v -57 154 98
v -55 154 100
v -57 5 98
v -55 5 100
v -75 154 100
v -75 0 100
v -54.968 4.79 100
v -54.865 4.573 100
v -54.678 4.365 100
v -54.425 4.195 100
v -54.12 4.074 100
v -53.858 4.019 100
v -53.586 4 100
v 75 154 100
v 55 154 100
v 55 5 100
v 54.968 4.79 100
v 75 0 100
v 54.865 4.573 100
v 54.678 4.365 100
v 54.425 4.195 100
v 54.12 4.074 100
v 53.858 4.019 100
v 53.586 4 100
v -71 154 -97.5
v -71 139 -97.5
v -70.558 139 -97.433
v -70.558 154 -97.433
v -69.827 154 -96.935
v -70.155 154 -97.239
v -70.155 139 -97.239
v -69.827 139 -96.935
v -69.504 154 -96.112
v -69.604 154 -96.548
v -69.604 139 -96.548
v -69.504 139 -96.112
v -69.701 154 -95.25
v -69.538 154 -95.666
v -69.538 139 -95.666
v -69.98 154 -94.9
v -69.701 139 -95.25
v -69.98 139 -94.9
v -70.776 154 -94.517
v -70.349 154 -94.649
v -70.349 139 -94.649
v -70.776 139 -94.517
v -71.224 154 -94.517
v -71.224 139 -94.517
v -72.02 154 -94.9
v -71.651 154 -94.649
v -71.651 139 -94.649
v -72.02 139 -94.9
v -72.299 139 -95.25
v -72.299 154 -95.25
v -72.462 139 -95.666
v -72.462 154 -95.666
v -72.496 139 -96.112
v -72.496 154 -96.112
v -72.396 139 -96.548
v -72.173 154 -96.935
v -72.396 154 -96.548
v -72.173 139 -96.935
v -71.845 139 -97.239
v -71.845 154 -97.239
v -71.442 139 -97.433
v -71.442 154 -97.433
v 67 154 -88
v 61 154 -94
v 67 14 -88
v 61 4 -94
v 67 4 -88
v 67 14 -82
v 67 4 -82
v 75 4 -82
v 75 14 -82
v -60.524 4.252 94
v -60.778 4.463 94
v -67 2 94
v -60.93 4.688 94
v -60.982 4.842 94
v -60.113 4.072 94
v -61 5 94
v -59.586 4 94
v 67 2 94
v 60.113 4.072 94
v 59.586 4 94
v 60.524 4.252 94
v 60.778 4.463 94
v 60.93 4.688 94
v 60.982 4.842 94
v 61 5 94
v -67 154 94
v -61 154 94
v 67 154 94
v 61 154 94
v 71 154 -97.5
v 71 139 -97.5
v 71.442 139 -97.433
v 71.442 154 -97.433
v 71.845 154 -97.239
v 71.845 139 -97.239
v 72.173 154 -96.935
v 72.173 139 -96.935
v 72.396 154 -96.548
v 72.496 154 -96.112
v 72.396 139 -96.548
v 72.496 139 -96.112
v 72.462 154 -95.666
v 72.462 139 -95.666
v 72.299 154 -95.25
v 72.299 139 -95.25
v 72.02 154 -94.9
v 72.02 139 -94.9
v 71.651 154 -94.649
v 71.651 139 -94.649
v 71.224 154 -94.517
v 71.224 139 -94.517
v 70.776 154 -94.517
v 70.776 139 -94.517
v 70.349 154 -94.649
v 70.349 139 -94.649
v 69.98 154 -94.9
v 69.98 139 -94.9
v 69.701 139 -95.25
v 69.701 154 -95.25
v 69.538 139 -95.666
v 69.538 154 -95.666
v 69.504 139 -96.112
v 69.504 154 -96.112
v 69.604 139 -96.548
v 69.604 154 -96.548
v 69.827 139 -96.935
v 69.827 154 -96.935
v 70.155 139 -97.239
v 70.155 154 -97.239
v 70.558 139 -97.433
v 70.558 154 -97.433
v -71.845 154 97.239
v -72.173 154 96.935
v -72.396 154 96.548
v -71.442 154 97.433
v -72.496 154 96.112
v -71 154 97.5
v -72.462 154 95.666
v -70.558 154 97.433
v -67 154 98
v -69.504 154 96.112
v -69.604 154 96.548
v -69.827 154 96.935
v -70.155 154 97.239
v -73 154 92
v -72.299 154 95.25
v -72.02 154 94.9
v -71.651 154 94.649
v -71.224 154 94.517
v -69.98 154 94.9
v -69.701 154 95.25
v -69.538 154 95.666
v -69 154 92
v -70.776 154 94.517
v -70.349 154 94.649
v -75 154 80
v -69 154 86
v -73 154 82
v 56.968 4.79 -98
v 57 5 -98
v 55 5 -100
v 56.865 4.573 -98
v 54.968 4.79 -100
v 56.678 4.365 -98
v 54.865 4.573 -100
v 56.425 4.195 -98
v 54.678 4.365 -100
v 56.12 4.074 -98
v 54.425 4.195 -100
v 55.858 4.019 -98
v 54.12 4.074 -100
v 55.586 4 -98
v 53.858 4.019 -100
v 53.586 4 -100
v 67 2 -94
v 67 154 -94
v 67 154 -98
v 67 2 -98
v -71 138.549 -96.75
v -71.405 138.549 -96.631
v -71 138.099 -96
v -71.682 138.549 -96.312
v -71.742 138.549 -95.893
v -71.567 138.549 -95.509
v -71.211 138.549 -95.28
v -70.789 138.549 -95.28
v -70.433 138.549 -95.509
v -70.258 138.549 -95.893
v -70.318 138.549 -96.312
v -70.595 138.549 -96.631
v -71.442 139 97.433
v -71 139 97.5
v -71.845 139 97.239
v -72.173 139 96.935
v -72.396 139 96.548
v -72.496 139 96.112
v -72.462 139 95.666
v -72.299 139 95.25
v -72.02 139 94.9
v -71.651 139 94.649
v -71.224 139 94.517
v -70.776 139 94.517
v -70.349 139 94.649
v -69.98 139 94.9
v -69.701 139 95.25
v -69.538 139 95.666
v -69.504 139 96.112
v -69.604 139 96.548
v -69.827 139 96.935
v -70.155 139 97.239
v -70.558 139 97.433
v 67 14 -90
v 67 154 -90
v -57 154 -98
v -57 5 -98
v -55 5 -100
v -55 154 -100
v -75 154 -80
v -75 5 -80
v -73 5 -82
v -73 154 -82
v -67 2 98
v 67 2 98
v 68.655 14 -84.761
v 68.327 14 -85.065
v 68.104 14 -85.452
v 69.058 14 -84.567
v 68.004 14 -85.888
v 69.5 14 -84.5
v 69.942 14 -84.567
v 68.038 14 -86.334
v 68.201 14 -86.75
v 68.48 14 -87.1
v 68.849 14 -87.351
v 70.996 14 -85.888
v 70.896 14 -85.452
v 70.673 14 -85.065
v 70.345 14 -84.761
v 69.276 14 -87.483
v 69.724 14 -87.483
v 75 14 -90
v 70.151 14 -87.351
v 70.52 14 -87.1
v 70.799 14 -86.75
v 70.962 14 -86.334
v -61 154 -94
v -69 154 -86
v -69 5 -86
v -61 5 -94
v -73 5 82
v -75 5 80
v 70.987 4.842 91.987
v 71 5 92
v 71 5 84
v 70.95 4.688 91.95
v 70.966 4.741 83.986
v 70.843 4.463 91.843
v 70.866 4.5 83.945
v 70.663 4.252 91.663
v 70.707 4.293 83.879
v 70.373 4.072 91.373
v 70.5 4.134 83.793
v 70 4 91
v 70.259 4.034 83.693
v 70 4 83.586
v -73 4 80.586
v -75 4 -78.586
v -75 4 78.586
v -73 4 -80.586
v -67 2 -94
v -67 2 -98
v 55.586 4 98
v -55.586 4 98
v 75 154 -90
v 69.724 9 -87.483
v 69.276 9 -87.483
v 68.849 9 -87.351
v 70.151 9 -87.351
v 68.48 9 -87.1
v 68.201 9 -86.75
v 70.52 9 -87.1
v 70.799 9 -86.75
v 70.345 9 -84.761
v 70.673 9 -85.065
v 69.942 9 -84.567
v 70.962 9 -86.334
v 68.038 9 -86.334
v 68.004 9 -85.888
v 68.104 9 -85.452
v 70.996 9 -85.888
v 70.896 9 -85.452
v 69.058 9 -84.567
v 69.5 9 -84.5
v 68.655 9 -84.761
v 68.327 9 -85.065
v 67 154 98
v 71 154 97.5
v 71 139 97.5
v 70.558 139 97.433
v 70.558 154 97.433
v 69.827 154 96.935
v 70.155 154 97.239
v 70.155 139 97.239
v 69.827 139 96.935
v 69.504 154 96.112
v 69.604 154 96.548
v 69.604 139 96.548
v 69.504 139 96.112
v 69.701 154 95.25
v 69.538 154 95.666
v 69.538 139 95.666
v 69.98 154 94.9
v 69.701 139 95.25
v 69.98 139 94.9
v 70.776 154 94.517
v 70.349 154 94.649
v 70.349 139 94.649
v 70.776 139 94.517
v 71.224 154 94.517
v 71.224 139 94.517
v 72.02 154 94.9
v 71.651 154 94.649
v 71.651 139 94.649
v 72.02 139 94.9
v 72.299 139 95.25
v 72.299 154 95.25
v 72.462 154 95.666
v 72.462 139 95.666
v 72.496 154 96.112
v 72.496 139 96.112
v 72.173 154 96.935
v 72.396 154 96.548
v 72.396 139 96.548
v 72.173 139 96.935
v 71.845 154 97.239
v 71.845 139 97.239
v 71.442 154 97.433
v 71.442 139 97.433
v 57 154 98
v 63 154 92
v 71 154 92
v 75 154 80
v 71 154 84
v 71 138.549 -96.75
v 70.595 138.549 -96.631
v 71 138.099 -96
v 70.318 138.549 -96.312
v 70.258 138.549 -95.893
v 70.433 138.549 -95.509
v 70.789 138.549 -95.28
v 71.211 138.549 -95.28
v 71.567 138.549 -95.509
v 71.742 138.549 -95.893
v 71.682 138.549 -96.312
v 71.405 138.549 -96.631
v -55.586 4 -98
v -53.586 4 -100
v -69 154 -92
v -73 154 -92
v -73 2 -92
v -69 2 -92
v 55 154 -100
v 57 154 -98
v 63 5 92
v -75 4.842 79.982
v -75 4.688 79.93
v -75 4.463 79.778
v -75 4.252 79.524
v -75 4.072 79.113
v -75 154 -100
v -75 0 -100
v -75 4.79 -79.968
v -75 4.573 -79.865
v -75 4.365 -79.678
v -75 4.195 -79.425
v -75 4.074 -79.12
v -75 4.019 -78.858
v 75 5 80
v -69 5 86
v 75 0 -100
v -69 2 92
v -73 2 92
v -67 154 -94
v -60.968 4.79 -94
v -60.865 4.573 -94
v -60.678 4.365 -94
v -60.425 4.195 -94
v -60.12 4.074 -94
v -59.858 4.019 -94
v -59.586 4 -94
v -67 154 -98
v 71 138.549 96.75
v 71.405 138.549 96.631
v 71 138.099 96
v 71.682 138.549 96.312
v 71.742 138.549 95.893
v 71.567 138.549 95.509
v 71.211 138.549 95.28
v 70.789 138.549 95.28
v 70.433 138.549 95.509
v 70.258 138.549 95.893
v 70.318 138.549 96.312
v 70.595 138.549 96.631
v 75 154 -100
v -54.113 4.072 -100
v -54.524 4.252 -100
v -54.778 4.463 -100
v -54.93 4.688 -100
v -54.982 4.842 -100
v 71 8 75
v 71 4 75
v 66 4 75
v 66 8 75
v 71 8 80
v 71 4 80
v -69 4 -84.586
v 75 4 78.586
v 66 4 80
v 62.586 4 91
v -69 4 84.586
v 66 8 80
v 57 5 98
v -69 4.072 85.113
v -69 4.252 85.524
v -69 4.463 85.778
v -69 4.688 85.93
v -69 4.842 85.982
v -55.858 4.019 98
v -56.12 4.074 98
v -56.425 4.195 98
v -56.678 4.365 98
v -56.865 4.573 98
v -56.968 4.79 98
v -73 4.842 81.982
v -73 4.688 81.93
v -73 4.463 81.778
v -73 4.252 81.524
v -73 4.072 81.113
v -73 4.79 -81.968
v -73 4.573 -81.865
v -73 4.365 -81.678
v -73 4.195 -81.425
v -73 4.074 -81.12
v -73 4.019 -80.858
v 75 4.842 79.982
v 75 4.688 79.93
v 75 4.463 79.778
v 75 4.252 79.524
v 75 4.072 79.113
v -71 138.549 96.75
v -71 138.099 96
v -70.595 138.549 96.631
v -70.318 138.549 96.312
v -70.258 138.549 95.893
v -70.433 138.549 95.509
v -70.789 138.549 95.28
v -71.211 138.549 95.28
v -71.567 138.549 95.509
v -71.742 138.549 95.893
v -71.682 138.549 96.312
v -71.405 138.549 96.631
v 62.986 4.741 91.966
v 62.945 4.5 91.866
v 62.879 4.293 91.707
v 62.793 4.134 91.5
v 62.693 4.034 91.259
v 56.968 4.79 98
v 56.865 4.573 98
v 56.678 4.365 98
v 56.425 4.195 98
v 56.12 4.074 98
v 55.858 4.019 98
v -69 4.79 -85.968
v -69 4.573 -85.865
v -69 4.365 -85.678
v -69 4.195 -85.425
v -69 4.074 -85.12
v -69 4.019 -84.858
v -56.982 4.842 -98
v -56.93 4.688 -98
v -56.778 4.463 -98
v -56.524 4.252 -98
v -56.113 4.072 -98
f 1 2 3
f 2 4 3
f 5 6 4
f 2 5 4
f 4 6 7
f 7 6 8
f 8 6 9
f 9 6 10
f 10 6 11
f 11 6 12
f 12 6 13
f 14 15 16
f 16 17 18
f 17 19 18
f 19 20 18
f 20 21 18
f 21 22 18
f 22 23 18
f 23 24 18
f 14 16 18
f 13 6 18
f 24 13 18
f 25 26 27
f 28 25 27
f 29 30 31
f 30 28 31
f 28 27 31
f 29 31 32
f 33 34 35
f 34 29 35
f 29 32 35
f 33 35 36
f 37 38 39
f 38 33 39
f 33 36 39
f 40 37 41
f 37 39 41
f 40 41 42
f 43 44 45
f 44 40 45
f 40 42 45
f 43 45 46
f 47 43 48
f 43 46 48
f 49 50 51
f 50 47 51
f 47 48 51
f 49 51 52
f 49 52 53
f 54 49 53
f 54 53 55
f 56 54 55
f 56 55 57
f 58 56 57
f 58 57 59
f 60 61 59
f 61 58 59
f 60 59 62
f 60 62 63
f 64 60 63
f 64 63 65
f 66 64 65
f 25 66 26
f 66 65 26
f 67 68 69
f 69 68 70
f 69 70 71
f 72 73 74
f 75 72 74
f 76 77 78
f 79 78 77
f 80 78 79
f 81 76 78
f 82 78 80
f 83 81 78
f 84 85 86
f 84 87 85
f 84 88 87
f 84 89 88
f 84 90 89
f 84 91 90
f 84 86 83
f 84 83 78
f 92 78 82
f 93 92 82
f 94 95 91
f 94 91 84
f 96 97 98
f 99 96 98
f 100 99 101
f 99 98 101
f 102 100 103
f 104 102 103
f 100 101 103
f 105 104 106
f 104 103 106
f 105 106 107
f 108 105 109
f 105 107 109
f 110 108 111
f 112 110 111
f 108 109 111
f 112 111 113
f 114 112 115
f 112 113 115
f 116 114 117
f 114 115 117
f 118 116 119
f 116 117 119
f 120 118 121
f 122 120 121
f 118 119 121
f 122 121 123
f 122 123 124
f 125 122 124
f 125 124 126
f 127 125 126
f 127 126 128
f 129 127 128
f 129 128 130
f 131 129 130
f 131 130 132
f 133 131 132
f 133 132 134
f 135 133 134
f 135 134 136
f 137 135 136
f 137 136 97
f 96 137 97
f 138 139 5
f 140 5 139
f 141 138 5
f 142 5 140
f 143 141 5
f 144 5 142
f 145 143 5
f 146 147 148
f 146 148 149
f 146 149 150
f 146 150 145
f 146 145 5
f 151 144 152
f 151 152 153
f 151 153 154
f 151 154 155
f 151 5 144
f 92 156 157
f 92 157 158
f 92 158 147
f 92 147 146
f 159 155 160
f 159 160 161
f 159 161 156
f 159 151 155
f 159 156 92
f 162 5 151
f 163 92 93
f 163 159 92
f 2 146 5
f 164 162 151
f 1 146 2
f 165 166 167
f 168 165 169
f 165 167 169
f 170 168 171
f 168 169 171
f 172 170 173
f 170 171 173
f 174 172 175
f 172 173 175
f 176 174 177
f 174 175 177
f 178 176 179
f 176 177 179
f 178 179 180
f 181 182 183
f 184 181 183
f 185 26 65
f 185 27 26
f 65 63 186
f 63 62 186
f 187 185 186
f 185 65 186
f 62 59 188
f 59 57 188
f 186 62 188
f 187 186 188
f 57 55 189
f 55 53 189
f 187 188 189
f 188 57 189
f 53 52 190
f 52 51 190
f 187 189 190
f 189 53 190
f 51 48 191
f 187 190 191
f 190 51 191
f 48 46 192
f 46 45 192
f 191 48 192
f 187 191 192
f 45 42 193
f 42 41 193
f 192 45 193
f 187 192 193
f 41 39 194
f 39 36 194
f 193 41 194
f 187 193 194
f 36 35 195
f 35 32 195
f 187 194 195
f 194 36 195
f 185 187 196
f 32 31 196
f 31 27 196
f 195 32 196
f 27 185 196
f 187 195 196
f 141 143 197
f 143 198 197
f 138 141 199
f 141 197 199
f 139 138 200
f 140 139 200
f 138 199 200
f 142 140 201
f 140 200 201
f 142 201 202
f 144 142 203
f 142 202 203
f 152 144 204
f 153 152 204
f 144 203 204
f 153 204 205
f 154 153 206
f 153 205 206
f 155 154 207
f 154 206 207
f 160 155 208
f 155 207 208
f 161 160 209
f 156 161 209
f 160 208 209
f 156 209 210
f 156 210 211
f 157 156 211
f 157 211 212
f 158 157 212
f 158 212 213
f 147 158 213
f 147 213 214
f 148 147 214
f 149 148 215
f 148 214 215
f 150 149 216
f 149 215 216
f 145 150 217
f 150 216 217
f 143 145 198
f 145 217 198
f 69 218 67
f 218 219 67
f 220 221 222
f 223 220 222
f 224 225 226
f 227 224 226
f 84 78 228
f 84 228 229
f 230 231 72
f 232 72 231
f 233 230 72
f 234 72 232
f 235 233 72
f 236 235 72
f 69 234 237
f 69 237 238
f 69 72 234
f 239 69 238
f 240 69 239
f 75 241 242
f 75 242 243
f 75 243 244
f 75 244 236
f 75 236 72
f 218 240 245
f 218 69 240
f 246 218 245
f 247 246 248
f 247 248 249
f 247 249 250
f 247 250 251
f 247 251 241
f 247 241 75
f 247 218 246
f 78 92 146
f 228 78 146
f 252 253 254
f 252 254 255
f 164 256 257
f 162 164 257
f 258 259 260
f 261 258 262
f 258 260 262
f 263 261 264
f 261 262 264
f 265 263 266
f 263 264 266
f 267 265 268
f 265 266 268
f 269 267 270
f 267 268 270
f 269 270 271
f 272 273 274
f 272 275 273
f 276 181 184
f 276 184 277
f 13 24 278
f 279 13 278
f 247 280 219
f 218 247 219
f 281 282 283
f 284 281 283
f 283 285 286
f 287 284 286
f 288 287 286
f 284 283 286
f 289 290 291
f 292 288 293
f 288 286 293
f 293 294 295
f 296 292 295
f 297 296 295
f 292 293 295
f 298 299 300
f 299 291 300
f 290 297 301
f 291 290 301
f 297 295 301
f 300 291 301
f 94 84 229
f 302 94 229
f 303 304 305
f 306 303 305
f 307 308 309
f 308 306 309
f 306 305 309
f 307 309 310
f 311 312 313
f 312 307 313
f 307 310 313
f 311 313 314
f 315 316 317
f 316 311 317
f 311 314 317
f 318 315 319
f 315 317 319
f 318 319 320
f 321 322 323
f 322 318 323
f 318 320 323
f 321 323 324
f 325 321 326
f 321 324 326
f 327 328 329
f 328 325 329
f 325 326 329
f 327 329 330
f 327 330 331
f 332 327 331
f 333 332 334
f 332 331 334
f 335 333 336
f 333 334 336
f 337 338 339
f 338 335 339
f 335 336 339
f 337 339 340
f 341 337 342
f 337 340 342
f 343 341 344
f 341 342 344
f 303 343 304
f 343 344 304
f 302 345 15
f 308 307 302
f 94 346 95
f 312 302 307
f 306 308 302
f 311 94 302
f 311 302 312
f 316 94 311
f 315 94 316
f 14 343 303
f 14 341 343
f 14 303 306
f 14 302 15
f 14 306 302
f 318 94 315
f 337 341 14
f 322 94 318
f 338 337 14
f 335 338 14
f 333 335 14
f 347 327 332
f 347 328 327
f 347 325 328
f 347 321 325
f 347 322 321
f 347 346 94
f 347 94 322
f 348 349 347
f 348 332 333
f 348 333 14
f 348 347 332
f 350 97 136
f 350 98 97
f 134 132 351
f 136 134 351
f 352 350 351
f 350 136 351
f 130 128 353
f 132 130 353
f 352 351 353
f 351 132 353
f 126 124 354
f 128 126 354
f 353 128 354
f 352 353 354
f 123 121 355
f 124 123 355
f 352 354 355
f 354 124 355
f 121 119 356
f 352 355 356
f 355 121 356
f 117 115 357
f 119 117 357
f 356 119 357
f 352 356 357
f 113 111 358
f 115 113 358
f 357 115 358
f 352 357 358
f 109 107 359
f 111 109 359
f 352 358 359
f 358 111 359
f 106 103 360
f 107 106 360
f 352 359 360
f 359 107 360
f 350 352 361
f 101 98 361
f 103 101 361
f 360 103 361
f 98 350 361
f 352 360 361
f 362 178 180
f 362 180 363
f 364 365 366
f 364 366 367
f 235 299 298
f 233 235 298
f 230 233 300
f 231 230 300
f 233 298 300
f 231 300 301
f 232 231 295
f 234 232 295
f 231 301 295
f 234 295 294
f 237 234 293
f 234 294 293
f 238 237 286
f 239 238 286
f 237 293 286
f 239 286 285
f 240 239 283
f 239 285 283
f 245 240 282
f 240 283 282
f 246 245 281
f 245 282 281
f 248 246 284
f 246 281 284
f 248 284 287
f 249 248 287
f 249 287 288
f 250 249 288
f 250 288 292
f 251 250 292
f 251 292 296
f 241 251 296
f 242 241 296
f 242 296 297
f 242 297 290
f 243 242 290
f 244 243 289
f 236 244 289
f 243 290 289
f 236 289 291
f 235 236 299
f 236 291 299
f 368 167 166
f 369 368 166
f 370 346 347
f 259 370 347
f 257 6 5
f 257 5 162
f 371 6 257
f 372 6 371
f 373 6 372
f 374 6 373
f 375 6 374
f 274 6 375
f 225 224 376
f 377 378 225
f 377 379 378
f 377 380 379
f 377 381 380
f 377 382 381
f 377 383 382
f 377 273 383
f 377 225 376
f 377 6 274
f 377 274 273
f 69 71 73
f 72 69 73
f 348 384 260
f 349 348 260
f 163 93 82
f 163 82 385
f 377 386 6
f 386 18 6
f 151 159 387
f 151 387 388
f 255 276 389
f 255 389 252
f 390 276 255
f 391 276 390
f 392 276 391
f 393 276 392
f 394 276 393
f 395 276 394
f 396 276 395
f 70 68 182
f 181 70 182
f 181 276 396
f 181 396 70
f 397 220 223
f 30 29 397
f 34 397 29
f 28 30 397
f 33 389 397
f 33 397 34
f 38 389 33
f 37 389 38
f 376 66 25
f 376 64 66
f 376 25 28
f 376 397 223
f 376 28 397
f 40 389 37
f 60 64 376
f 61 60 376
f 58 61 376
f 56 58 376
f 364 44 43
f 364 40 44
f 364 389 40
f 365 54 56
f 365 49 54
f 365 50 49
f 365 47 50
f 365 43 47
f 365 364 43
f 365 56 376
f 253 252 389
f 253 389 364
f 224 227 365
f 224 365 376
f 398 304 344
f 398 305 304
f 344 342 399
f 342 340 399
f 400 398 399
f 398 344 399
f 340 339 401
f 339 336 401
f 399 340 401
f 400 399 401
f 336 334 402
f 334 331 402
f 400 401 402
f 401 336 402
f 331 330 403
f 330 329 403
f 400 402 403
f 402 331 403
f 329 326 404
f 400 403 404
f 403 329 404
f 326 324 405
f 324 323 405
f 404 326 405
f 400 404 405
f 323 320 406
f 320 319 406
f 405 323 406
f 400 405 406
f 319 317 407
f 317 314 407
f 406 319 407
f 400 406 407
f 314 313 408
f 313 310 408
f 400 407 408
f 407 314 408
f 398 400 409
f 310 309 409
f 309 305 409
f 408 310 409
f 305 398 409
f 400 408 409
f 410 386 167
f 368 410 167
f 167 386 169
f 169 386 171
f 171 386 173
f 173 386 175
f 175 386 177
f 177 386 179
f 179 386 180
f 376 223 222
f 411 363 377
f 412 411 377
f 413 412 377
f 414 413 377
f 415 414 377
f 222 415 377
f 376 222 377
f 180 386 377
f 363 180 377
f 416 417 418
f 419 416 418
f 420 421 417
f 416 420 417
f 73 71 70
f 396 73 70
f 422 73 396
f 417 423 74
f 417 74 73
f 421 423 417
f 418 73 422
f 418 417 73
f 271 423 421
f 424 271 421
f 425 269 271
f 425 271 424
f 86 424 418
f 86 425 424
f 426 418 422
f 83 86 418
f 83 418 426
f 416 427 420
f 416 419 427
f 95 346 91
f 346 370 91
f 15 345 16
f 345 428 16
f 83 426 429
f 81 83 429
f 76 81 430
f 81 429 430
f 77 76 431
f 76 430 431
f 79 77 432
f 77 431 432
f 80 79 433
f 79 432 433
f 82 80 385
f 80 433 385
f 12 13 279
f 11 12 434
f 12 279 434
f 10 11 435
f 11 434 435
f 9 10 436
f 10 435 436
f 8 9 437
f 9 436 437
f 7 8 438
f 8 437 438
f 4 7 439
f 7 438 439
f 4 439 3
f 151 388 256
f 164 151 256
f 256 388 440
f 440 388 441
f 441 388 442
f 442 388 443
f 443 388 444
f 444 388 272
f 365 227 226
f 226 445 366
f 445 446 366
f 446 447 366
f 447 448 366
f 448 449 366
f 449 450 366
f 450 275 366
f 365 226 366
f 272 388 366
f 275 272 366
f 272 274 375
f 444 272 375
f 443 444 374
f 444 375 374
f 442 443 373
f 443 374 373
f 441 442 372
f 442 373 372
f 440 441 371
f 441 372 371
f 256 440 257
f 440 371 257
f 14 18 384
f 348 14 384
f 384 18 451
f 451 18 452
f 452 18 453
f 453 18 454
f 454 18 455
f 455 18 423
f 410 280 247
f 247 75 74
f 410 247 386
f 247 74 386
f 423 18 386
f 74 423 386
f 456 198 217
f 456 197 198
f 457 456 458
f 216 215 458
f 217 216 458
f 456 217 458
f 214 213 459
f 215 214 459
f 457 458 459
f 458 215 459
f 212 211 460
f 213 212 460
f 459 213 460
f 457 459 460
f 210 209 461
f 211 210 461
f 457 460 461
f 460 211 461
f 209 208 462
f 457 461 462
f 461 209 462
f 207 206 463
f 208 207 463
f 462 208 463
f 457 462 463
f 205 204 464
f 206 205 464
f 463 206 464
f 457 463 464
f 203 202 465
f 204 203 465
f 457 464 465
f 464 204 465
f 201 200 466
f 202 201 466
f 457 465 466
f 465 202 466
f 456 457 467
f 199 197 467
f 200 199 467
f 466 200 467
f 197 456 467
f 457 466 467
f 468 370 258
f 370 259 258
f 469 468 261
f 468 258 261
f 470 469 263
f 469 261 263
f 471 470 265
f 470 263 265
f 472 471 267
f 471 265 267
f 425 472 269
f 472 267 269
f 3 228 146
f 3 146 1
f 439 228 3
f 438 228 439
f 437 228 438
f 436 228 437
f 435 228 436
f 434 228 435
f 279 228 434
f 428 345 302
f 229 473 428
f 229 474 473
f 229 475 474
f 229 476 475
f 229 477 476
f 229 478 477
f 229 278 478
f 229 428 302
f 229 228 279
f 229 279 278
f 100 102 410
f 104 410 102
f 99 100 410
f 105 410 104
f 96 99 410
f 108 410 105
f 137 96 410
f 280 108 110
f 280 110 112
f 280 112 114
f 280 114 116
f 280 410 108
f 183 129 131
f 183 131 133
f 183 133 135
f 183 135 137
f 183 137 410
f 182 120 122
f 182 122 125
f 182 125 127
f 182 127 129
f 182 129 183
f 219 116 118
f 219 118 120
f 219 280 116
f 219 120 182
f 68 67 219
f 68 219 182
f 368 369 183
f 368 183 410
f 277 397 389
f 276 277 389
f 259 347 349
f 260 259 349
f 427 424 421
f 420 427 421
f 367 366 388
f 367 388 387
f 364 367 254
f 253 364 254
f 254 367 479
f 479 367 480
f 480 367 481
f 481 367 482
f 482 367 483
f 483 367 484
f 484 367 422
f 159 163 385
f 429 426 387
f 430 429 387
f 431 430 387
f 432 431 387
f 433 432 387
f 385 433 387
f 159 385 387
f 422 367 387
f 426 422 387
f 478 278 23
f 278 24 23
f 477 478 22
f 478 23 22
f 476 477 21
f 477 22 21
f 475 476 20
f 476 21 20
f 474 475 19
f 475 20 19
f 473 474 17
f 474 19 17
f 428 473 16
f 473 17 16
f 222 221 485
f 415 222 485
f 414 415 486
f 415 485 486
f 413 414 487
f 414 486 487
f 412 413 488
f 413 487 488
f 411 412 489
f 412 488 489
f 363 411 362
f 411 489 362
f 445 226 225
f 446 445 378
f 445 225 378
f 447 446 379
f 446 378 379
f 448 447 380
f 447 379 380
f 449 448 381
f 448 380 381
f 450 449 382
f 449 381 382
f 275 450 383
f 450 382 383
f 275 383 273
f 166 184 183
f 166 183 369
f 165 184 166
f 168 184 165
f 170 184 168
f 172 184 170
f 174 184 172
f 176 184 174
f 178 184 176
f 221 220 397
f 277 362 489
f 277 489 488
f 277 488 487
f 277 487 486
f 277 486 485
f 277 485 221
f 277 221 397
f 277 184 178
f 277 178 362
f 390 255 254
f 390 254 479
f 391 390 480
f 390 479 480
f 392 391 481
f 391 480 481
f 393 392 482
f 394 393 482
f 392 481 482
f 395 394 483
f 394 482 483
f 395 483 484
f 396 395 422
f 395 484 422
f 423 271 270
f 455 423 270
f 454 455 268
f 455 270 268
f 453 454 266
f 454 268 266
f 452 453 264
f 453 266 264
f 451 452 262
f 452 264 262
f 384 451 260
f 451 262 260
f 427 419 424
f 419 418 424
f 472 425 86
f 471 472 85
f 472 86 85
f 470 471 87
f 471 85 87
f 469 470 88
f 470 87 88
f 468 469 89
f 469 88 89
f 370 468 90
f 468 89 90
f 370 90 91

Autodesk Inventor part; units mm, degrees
ref_plane "YZ Plane" through (0, 0, 0) normal (1, 0, 0) x (0, 1, 0)
ref_plane "XZ Plane" through (0, 0, 0) normal (0, 1, 0) x (-1, 0, 0)
sketch "Náčrt1" plane through (0, 0, 0) normal (0, 1, 0) x (-1, 0, 0)
  line L0 (75, 100) -> (-75, 100)
  line L1 (-75, 100) -> (-75, -100)
  line L2 (-75, -100) -> (75, -100)
  line L3 (75, -100) -> (75, 100)
  line L4 (105, 0) -> (-105, 0) projected
  line L5 (0, -140) -> (0, 140) projected
  point P0 (0, 0)
  dimension "d0" = 200
  dimension "d1" = 150
extrude "Vysunutí1" add sketch "Náčrt1" along normal blind 4
sketch "Náčrt2" plane through (0, 4, 0) normal (0, 1, 0) x (1, 0, 0)
  line L0 (-75, -100) -> (-75, -80)
  line L1 (-75, -100) -> (-55, -100)
  line L2 (-75, 100) -> (-75, -100) projected
  line L3 (-75, -100) -> (75, -100) projected
  line L4 (-69, -86) -> (-69, -92)
  line L5 (-69, -92) -> (-73, -92)
  line L6 (-73, -92) -> (-73, -82)
  line L7 (-73, -82) -> (-75, -80)
  line L8 (-67, -98) -> (-57, -98)
  line L9 (-61, -94) -> (-67, -94)
  line L10 (-67, -94) -> (-67, -98)
  line L11 (-55, -100) -> (-57, -98)
  line L12 (-61, -94) -> (-69, -86)
  point P0 (0, 0)
  dimension "d4" = 20
  dimension "d9" = 2
  dimension "d10" = 4
  dimension "d11" = 10
  dimension "d12" = 6
  dimension "d13" = 8
  dimension "d17" = 4
  dimension "d18" = 2
  dimension "d19" = 8
  dimension "d20" = 10
  dimension "d21" = 6
extrude "Vysunutí2" add sketch "Náčrt2" along normal blind 150
mirror "Zrcadlit1" about plane through (0, 0, 0) normal (0, 0, 1) of "Vysunutí2"
sketch "Náčrt3" plane through (0, 154, 0) normal (0, 1, 0) x (1, 0, 0)
  line L0 (-69, -92) -> (-73, -92) projected
  line L1 (-67, -98) -> (-67, -94) projected
  point P0 (0, 0)
  point P1 (-71, -96)
  dimension "d22" = 4
  dimension "d23" = 4
hole "Díra1" at (-71, 154, 96) direction (0, -1, 0) diameter 3 depth 15 tip angle 118
mirror "Zrcadlit2" about plane through (0, 0, 0) normal (0, 0, 1) of "Díra1"
sketch "Náčrt4" plane through (0, 4, 0) normal (0, 1, 0) x (1, 0, 0)
  line L0 (55, -100) -> (75, -100)
  line L1 (75, -100) -> (75, -80)
  line L2 (-55, -100) -> (75, -100) projected
  line L3 (75, -100) -> (75, 100) projected
  line L4 (57, -98) -> (67, -98)
  line L5 (67, -98) -> (67, -94)
  line L6 (67, -94) -> (61, -94)
  line L7 (75, -80) -> (61, -94)
  line L8 (57, -98) -> (55, -100)
  point P0 (0, 0)
  dimension "d31" = 20
  dimension "d32" = 20
  dimension "d37" = 10
  dimension "d38" = 6
  dimension "d39" = 8
  dimension "d40" = 2
  dimension "d41" = 45
extrude "Vysunutí3" add sketch "Náčrt4" along normal blind 150
mirror "Zrcadlit3" about plane through (0, 0, 0) normal (0, 0, 1) of "Vysunutí3"
ref_plane "Pracovní rovina1" through (0, 14, 0) normal (0, 1, 0) x (1, 0, 0)
sketch "Náčrt7" plane through (0, 4, 0) normal (0, 1, 0) x (1, 0, 0)
  line L0 (66, -80) -> (71, -80)
  line L1 (71, -80) -> (71, -75)
  line L2 (71, -75) -> (66, -75)
  line L3 (66, -75) -> (66, -80)
  line L4 (75, -80) -> (75, 80) projected
  line L5 (55, -100) -> (75, -100) projected
  point P0 (0, 0)
  dimension "d51" = 4
  dimension "d52" = 5
  dimension "d53" = 20
  dimension "d54" = 5
extrude "Vysunutí6" add sketch "Náčrt7" along normal blind 4
mirror "Zrcadlit4" about plane through (0, 0, 0) normal (1, 0, 0) of "Díra1", "Zrcadlit2"
sketch "Náčrt9" plane through (0, 4, 0) normal (0, 1, 0) x (1, 0, 0)
  line L0 (-67, -94) -> (67, -94)
  line L1 (67, -94) -> (67, -98)
  line L2 (67, -98) -> (-67, -98)
  line L3 (-67, -98) -> (-67, -94)
  line L4 (-67, -98) -> (-67, -94) projected
  line L5 (67, -94) -> (67, -98) projected
  line L6 (-57, -98) -> (-67, -98) projected
  line L7 (-67, -94) -> (-61, -94) projected
  point P0 (0, 0)
extrude "Vysunutí7" cut sketch "Náčrt9" against normal blind 2
mirror "Zrcadlit5" about plane through (0, 0, 0) normal (0, 0, 1) of "Vysunutí7"
sketch "Náčrt10" plane through (0, 4, 0) normal (0, 1, 0) x (1, 0, 0)
  line L0 (-69, -92) -> (-73, -92)
  line L1 (-73, -92) -> (-73, 92)
  line L2 (-73, 92) -> (-69, 92)
  line L3 (-69, 92) -> (-69, -92)
  line L4 (-69, 92) -> (-73, 92) projected
  line L5 (-69, -92) -> (-73, -92) projected
  line L6 (-73, -92) -> (-73, -82) projected
  line L7 (-69, -86) -> (-69, -92) projected
  point P0 (0, 0)
extrude "Vysunutí8" cut sketch "Náčrt10" against normal blind 2
sketch "Náčrt11" plane through (0, 154, 0) normal (0, 1, 0) x (1, 0, 0)
  line L0 (63, -92) -> (71, -92)
  line L1 (71, -92) -> (71, -84)
  line L2 (71, -84) -> (63, -84)
  line L3 (63, -84) -> (63, -92)
  line L4 (66, -80) -> (71, -80) projected
  line L5 (75, -80) -> (75, 80) projected
  line L6 (75, -80) -> (61, -94) projected
  point P0 (0, 0)
  dimension "d70" = 8
  dimension "d71" = 4
extrude "Vysunutí9" cut sketch "Náčrt11" against normal up to surface (150 mm away)
fillet "Zaoblení1" radius 1 12 edges at (-65, 4, 90) (-56, 4, 99) (-74, 4, 81) (-65, 4, -90) (-74, 4, -81) (-56, 4, -99) (56, 4, -99) (56, 4, 99) (62, 4, 93) (73, 4, 82) (67, 4, 92) (71, 4, 88)
sketch "Náčrt13" plane through (55, 154, -100) normal (0, 1, 0) x (1, 0, 0)
  line L0 (20, -10) -> (12, -10)
  line L1 (12, -10) -> (12, -20)
  line L2 (12, -20) -> (20, -20)
  line L3 (20, -20) -> (20, -10)
  line L4 (20, 0) -> (20, -20) projected
  point P0 (-55, -100)
  dimension "d78" = 10
  dimension "d79" = 8
extrude "Vysunutí11" cut sketch "Náčrt13" against normal up to surface (150 mm away)
sketch "Náčrt14" plane through (0, 4, 0) normal (0, 1, 0) x (1, 0, 0)
  line L0 (67, 82) -> (75, 82)
  line L1 (75, 82) -> (75, 90)
  line L2 (75, 90) -> (67, 90)
  line L3 (67, 90) -> (67, 82)
  line L4 (67, 88) -> (67, 90) projected
  line L5 (67, 90) -> (75, 90) projected
  line L6 (75, -78.5858) -> (75, 90) projected
  point P0 (0, 0)
  dimension "d82" = 8
extrude "Vysunutí12" add sketch "Náčrt14" along normal blind 10
sketch "Náčrt15" plane through (0, 14, 0) normal (0, 1, 0) x (1, 0, 0)
  line L0 (75, 82) -> (75, 90) projected
  line L1 (67, 90) -> (75, 90) projected
  point P0 (0, 0)
  point P1 (69.5, 86)
  dimension "d85" = 5.5
  dimension "d86" = 4
hole "Díra3" at (69.5, 14, -86) direction (0, -1, 0) diameter 3 depth 5
properties part number "Cabinet"
